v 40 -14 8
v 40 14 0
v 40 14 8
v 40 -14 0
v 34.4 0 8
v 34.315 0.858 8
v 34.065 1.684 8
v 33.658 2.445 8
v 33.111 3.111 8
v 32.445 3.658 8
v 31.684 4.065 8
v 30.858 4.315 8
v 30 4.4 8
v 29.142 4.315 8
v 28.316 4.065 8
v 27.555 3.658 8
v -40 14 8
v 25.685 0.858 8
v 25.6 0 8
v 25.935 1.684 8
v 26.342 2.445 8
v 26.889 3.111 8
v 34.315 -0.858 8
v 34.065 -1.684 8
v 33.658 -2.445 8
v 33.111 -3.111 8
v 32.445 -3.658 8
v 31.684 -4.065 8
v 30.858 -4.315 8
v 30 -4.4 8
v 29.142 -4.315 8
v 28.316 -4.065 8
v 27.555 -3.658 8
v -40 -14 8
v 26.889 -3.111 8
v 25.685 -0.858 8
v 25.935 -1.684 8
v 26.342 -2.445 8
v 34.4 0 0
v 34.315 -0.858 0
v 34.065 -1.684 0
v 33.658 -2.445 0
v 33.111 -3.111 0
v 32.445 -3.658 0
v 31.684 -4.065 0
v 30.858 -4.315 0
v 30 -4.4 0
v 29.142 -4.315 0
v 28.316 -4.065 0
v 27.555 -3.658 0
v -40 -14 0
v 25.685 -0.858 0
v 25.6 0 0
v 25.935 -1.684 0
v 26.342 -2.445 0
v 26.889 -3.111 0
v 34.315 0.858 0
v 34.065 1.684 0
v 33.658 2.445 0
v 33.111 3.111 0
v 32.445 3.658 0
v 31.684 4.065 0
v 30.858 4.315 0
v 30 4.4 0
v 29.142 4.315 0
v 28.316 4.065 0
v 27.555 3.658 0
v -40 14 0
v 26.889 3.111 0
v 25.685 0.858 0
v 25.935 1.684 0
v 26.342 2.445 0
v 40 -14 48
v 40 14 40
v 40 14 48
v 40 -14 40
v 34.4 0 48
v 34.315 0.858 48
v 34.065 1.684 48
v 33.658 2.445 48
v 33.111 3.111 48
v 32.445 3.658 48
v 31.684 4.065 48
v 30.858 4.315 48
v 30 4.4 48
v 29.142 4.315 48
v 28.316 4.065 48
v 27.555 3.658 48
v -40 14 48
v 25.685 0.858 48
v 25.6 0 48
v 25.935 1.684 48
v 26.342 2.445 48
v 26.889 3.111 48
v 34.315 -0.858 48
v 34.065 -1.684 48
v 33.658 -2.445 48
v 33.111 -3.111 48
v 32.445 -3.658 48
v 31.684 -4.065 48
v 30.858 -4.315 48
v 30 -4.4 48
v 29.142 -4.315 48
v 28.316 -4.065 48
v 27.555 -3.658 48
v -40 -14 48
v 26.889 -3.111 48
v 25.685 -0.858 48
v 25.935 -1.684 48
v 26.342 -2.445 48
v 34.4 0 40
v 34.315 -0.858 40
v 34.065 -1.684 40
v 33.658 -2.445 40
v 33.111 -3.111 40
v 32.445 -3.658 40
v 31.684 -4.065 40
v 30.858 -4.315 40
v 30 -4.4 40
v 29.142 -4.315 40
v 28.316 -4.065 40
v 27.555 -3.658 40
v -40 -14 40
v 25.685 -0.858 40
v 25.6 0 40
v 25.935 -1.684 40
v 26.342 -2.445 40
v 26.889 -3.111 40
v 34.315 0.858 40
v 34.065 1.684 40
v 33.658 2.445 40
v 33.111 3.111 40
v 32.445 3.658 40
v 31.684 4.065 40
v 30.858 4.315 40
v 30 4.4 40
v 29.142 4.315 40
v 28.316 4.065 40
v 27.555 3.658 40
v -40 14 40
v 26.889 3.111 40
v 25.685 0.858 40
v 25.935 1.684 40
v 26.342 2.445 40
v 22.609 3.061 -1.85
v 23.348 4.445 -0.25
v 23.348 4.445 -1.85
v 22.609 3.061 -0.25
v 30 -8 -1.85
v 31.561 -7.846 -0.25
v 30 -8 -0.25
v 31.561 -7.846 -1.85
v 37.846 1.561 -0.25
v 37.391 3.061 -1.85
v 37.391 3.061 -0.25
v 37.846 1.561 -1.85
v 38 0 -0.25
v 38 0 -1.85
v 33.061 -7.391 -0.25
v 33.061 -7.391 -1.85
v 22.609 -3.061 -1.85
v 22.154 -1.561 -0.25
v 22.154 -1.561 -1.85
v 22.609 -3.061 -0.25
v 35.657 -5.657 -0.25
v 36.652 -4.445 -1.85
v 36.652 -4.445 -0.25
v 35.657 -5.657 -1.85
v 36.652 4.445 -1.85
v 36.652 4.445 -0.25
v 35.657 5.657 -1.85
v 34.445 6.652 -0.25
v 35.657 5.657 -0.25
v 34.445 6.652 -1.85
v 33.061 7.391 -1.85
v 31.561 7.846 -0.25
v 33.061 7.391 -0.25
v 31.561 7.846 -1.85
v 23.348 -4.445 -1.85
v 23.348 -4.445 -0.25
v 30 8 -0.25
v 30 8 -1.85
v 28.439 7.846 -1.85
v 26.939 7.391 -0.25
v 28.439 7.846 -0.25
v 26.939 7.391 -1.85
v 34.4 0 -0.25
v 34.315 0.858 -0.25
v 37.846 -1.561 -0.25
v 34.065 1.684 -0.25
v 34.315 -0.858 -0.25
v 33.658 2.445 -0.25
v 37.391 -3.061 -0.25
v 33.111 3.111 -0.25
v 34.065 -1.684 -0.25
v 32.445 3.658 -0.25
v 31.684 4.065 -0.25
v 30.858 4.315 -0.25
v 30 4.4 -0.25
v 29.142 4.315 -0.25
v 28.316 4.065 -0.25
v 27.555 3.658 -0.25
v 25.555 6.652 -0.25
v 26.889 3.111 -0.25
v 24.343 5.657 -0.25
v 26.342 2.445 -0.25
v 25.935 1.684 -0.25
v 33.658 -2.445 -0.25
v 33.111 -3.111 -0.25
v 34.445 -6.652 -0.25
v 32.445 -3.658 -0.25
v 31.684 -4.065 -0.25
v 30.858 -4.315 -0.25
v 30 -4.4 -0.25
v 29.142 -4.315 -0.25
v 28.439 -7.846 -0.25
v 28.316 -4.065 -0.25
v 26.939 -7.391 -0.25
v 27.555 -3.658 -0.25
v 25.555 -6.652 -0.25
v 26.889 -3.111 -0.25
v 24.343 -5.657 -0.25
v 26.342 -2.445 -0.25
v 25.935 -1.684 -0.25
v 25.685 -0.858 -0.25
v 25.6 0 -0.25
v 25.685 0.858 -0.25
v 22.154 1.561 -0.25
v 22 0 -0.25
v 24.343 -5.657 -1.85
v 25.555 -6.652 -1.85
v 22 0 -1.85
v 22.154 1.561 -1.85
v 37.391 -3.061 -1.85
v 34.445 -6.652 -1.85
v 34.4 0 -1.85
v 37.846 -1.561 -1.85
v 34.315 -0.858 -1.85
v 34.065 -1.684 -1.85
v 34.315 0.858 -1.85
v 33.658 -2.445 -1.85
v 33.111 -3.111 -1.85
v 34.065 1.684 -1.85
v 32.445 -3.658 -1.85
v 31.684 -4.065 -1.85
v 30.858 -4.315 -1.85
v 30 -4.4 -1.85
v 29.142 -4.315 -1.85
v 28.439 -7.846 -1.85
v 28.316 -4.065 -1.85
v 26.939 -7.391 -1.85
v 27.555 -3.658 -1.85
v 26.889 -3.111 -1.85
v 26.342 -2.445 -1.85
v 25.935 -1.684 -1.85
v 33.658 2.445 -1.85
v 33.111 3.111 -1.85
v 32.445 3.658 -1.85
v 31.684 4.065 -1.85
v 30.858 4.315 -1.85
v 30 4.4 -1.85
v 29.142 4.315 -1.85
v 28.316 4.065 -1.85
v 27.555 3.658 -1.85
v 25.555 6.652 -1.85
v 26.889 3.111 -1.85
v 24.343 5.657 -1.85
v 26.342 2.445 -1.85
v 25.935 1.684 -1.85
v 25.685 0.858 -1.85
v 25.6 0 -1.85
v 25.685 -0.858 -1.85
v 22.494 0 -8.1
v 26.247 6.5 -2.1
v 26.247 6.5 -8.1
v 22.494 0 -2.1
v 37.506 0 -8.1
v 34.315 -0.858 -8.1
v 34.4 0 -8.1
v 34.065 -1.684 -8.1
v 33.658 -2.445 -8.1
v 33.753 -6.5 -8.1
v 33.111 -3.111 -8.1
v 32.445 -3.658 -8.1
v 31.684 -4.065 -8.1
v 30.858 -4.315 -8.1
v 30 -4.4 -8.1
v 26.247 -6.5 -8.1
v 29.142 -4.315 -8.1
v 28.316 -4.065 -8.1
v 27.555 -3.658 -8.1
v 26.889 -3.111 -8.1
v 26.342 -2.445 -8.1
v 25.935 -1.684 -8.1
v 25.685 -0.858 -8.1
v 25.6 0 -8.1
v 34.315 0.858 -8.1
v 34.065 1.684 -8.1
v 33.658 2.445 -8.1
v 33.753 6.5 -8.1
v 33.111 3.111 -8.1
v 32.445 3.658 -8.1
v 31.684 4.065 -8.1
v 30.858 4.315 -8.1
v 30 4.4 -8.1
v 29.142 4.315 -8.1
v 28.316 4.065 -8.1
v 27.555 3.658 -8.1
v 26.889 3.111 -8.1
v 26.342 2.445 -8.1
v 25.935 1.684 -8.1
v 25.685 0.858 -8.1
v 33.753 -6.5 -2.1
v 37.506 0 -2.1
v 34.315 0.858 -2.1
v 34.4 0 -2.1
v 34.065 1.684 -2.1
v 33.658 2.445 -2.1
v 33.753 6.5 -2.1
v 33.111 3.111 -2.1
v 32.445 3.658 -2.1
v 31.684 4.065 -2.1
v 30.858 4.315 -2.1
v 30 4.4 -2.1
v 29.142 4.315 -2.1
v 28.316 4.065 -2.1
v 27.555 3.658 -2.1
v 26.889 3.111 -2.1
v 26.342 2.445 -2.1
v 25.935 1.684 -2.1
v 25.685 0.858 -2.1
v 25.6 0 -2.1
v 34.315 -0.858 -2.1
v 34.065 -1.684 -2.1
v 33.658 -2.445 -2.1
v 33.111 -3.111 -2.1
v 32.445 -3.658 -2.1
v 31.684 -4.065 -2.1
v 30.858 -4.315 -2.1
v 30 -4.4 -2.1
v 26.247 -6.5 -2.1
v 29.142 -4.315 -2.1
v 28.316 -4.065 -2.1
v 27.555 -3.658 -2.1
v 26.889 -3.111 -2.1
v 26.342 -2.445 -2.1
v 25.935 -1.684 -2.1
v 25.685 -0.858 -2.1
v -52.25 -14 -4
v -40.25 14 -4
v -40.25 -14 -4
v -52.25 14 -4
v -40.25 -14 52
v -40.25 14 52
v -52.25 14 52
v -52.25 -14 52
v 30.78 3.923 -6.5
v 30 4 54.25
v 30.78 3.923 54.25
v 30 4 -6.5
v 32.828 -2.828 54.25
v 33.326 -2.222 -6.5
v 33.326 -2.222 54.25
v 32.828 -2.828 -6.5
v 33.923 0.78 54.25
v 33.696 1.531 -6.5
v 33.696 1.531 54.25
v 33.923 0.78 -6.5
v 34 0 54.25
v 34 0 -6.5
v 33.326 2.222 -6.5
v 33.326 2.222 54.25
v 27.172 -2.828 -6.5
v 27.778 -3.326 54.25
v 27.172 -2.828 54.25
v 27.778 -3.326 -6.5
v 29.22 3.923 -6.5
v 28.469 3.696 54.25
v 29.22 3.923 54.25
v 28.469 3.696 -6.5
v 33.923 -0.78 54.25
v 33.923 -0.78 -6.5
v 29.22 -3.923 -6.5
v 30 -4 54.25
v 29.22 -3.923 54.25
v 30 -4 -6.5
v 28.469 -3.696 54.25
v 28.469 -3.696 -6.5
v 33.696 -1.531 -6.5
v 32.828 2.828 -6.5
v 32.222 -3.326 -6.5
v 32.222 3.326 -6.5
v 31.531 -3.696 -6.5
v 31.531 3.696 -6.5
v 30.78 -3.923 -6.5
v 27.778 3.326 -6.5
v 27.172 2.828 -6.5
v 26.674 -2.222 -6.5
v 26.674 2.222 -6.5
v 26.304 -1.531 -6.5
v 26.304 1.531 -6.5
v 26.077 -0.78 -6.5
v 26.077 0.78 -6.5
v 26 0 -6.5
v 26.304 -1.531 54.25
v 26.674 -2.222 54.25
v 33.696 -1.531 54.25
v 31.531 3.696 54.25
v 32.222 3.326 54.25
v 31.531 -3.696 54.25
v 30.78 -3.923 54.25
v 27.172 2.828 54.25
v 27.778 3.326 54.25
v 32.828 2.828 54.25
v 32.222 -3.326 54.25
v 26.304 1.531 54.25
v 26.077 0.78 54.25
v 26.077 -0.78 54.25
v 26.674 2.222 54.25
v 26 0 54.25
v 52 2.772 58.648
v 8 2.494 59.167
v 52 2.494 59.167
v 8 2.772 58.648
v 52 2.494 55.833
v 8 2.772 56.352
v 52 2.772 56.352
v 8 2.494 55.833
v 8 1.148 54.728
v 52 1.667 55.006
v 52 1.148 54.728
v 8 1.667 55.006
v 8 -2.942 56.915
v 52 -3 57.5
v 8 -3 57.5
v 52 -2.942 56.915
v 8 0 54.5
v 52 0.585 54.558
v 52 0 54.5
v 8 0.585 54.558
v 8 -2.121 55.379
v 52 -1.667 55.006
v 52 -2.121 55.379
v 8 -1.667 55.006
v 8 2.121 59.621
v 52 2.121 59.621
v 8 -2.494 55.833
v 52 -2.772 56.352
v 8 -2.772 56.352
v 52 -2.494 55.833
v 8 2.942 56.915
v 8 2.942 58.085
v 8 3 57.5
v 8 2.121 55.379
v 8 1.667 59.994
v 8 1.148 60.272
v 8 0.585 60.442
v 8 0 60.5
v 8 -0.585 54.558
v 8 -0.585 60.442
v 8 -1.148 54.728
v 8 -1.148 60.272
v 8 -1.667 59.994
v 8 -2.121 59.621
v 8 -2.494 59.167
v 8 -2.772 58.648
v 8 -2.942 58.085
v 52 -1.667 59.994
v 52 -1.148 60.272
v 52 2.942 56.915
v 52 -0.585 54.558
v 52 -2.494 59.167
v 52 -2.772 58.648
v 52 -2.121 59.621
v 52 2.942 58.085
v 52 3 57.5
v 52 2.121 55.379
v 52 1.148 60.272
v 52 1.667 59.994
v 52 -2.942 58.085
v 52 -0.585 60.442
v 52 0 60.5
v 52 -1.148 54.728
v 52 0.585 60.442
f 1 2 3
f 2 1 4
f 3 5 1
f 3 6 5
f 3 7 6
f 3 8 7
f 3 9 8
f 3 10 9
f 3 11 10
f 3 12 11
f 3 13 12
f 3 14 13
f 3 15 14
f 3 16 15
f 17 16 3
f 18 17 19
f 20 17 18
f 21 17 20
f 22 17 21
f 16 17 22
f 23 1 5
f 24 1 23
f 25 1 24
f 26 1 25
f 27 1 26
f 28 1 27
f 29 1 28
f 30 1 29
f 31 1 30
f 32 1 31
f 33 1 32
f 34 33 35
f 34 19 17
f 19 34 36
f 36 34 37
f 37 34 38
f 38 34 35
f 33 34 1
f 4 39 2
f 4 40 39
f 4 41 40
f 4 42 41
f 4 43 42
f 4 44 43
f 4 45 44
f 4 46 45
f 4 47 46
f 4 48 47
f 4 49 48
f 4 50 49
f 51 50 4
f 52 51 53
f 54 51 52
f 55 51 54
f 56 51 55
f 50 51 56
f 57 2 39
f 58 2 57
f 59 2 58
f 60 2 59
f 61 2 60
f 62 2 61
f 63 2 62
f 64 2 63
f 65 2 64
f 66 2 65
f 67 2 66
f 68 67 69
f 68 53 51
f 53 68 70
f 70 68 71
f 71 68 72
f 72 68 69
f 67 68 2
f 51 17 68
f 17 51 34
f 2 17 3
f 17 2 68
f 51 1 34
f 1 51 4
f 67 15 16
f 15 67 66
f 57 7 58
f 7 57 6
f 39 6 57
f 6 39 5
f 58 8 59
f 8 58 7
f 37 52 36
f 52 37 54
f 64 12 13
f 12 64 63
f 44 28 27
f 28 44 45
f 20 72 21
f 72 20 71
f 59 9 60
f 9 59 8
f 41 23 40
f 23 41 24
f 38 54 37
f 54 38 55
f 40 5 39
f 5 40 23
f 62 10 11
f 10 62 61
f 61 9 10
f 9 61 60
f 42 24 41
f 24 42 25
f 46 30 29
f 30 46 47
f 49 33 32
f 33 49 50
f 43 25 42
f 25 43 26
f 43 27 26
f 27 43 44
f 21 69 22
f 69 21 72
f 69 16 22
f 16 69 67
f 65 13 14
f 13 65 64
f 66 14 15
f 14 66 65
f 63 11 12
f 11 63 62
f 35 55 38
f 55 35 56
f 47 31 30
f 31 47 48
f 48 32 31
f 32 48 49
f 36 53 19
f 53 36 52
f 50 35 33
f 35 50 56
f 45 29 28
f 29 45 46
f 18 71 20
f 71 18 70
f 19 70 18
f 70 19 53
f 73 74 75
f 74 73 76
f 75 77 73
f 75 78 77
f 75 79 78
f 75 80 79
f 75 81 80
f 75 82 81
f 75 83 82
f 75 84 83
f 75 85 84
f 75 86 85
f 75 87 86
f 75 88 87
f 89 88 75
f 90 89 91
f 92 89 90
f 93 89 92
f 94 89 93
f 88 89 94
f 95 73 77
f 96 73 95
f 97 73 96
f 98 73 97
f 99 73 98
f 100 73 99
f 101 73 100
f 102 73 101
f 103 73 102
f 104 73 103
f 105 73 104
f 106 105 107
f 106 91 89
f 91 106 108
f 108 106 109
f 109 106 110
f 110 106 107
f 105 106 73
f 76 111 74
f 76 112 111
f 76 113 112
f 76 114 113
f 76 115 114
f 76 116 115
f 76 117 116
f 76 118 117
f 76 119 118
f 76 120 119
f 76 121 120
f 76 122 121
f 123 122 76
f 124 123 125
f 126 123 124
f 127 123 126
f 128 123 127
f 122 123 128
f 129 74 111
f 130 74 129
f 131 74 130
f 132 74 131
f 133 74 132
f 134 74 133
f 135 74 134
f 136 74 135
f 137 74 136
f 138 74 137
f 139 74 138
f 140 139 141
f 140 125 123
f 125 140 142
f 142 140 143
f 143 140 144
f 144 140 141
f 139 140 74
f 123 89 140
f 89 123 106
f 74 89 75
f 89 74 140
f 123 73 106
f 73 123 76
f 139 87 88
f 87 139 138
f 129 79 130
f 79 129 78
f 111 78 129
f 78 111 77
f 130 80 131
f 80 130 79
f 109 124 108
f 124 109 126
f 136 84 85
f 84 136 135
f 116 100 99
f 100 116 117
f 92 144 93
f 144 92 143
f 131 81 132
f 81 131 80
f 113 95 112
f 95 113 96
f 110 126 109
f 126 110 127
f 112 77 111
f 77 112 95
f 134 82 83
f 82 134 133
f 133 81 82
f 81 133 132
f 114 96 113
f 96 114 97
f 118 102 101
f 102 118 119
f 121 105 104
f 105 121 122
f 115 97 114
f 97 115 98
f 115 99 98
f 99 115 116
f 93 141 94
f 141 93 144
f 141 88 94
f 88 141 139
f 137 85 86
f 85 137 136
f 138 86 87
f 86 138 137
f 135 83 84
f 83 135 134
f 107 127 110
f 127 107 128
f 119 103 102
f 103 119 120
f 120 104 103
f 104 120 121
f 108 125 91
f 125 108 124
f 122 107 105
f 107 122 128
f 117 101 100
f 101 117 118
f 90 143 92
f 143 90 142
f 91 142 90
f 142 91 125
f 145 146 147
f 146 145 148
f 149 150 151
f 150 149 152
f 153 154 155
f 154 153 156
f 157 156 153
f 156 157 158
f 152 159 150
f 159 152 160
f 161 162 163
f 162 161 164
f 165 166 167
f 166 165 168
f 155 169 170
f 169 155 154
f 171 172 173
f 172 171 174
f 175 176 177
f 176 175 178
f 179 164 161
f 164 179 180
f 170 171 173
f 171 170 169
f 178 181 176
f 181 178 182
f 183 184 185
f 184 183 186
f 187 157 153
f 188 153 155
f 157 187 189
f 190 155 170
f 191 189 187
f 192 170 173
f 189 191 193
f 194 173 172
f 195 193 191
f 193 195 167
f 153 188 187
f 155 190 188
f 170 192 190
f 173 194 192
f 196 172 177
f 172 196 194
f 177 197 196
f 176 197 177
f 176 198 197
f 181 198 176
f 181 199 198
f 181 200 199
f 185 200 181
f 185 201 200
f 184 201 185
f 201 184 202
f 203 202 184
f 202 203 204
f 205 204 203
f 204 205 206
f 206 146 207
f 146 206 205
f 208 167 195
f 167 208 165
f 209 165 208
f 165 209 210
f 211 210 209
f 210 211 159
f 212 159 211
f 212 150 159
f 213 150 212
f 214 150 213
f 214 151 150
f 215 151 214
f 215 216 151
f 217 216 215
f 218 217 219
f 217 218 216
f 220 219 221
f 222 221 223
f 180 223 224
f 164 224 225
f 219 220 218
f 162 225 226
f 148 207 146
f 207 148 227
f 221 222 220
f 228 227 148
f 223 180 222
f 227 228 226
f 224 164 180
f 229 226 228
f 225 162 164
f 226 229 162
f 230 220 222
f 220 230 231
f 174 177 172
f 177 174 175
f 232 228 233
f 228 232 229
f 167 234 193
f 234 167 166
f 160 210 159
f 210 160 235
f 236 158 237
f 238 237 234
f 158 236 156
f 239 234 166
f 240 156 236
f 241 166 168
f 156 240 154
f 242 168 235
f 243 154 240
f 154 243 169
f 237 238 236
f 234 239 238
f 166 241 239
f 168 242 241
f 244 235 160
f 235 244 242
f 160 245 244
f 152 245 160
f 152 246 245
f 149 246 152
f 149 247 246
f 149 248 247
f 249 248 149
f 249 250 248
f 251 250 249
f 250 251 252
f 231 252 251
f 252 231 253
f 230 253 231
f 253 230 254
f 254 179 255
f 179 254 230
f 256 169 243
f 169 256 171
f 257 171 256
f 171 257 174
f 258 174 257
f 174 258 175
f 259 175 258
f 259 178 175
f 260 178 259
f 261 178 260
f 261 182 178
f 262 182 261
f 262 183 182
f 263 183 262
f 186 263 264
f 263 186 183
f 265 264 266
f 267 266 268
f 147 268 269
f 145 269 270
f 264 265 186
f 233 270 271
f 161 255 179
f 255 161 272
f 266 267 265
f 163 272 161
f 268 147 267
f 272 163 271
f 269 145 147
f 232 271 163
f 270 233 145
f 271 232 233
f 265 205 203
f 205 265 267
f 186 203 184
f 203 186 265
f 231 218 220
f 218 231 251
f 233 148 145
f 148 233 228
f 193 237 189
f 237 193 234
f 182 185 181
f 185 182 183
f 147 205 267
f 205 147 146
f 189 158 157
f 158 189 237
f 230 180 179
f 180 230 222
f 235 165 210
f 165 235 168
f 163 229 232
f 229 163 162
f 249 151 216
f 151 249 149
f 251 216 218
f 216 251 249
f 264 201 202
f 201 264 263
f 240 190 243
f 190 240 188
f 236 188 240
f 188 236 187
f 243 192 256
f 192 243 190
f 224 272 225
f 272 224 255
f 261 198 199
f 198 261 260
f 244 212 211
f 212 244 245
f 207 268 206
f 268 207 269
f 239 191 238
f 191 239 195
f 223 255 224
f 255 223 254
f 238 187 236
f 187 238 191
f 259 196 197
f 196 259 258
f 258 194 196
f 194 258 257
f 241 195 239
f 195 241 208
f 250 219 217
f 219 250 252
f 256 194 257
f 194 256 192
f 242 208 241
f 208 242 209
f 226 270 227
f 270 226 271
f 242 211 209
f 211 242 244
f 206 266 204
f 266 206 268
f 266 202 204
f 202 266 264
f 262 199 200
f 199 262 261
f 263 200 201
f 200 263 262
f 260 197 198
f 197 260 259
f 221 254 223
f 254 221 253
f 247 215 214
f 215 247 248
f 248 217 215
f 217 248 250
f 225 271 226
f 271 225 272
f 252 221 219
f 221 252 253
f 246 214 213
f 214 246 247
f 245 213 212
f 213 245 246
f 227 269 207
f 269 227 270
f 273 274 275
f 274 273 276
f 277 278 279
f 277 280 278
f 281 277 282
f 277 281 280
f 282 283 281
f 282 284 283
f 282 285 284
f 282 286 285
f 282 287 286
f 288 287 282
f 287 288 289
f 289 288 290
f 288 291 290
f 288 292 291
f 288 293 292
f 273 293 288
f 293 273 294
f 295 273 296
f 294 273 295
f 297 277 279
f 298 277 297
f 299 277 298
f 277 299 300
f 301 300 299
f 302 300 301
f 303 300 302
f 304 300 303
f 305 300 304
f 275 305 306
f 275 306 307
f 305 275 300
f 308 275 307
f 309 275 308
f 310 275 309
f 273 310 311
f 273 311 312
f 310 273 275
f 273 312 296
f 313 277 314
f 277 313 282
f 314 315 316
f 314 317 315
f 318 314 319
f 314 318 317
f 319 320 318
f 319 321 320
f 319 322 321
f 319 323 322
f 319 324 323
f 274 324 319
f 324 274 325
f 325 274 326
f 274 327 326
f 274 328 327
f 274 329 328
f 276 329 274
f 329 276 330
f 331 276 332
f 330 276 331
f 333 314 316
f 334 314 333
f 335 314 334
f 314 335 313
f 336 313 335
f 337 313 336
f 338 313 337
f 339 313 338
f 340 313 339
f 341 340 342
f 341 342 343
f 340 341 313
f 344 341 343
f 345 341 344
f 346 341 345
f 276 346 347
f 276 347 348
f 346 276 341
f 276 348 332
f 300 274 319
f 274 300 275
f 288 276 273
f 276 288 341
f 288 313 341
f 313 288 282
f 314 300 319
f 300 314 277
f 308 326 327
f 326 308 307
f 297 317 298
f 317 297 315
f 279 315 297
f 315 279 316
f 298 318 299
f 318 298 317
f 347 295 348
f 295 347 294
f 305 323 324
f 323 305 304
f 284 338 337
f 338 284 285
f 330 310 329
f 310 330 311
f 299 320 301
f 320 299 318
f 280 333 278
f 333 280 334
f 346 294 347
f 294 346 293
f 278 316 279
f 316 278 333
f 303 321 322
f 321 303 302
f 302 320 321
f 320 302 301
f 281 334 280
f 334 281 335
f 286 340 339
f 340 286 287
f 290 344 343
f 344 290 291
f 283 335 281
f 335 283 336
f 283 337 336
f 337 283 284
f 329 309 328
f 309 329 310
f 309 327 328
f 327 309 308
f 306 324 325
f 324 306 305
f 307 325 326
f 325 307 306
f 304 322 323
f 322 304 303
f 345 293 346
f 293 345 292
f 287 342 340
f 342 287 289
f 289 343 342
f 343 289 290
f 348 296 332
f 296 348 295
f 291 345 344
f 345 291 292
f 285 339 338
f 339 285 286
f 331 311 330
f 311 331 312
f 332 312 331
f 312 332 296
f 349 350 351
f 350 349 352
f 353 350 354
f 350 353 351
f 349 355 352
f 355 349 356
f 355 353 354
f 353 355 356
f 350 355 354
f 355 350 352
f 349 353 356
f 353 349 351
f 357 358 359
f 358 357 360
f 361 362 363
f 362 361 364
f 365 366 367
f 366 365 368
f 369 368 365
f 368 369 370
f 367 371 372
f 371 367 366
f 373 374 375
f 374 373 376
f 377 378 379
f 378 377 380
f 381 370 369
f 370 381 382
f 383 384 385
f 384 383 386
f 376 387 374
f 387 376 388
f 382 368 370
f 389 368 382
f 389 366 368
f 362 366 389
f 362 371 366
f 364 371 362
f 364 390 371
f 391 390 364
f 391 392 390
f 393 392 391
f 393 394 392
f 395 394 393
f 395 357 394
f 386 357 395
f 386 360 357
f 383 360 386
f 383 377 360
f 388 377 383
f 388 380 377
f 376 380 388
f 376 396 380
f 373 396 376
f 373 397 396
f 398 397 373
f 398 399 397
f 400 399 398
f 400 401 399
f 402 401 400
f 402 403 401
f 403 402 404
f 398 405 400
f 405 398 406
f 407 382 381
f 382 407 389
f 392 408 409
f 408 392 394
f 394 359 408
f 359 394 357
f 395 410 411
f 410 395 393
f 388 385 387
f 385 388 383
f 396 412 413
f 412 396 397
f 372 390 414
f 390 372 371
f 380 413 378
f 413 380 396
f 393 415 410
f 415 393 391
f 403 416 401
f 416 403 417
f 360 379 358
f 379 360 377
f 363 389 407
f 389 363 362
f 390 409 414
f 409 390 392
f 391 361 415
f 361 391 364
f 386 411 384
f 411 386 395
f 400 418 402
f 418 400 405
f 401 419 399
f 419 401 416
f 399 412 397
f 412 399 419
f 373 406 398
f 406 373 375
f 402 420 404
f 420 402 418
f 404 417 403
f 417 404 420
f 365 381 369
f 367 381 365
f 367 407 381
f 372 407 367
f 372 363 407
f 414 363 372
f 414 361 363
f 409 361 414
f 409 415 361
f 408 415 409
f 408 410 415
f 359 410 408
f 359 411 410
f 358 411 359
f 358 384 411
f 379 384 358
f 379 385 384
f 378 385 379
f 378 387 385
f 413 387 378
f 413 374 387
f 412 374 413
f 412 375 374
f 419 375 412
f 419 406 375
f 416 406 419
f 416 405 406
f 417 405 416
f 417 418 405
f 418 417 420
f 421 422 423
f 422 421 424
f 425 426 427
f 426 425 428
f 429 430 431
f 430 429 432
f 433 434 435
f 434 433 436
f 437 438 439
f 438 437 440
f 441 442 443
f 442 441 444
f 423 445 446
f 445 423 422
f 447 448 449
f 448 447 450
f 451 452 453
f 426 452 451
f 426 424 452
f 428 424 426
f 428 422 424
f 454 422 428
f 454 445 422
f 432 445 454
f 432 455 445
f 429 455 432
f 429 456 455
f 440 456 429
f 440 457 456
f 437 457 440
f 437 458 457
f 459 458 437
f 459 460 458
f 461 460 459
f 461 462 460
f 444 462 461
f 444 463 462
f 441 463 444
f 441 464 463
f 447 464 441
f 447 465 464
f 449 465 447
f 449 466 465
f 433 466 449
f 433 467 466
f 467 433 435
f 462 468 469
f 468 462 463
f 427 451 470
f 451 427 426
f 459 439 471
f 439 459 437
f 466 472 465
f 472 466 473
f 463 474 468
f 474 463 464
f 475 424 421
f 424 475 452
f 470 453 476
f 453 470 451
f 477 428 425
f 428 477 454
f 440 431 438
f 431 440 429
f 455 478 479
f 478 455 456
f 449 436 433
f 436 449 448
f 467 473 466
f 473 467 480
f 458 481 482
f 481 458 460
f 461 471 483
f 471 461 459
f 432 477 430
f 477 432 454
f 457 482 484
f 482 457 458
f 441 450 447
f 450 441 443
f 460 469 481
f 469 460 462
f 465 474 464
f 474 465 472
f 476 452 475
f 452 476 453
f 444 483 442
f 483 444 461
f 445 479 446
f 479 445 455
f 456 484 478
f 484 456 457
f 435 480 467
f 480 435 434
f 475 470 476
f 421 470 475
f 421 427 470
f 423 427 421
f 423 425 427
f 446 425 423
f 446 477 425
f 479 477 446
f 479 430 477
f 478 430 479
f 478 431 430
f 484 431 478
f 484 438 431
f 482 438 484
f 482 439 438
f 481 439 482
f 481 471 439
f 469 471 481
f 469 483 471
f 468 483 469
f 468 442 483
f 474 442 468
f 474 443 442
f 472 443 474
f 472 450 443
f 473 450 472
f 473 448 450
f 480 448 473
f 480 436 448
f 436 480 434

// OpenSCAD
$fn = 32;

// ------------------------------------------------------------------------
// C clamp: throat 40 mm, screw d8
// Every part is its own module, assembly() places every instance.
// ------------------------------------------------------------------------

// --- part 1 ---
module clamp_arm() {
  difference() {
    translate([-40, -14, 0]) cube([80, 28, 8]);
    translate([30, 0, -1]) cylinder(h = 10, d = 8.8);
  }
}

// --- part 2 ---
module clamp_spine() {
  difference() {
    translate([-28, -14, 0]) cube([56, 28, 12]);
  }
}

// --- part 3 ---
module clamp_screw() {
  translate([0, 0, -30.375]) cylinder(h = 60.75, d = 8);
}

// --- part 4 ---
module clamp_washer() {
  difference() {
      translate([0, 0, 0]) cylinder(h = 1.6, d = 16);
      translate([0, 0, -1]) cylinder(h = 3.6, d = 8.8);
    }
}

// --- part 5 ---
module clamp_nut() {
  difference() {
    linear_extrude(height = 6) polygon(points = [[7.506, 0], [3.753, 6.5], [-3.753, 6.5], [-7.506, 0], [-3.753, -6.5], [3.753, -6.5]]);
    translate([0, 0, -1]) cylinder(h = 8, d = 8.8);
  }
}

// --- part 6 ---
module tommy_bar() {
  translate([0, 0, -22]) cylinder(h = 44, d = 6);
}

// --- assembly ---
module assembly() {
  color([0.80, 0.24, 0.20]) translate([0, 0, 0]) rotate([0, 0, 0]) clamp_arm();
  color([0.20, 0.45, 0.75]) translate([0, 0, 40]) rotate([0, 0, 0]) clamp_arm();
  color([0.25, 0.62, 0.32]) translate([-52.25, 0, 24]) rotate([0, 90, 0]) clamp_spine();
  color([0.92, 0.70, 0.18]) translate([30, 0, 23.875]) rotate([0, 0, 0]) clamp_screw();
  color([0.58, 0.35, 0.70]) translate([30, 0, -1.85]) rotate([0, 0, 0]) clamp_washer();
  color([0.16, 0.66, 0.66]) translate([30, 0, -8.1]) rotate([0, 0, 0]) clamp_nut();
  color([0.85, 0.48, 0.18]) translate([30, 0, 57.5]) rotate([0, 90, 0]) tommy_bar();
}

assembly();
